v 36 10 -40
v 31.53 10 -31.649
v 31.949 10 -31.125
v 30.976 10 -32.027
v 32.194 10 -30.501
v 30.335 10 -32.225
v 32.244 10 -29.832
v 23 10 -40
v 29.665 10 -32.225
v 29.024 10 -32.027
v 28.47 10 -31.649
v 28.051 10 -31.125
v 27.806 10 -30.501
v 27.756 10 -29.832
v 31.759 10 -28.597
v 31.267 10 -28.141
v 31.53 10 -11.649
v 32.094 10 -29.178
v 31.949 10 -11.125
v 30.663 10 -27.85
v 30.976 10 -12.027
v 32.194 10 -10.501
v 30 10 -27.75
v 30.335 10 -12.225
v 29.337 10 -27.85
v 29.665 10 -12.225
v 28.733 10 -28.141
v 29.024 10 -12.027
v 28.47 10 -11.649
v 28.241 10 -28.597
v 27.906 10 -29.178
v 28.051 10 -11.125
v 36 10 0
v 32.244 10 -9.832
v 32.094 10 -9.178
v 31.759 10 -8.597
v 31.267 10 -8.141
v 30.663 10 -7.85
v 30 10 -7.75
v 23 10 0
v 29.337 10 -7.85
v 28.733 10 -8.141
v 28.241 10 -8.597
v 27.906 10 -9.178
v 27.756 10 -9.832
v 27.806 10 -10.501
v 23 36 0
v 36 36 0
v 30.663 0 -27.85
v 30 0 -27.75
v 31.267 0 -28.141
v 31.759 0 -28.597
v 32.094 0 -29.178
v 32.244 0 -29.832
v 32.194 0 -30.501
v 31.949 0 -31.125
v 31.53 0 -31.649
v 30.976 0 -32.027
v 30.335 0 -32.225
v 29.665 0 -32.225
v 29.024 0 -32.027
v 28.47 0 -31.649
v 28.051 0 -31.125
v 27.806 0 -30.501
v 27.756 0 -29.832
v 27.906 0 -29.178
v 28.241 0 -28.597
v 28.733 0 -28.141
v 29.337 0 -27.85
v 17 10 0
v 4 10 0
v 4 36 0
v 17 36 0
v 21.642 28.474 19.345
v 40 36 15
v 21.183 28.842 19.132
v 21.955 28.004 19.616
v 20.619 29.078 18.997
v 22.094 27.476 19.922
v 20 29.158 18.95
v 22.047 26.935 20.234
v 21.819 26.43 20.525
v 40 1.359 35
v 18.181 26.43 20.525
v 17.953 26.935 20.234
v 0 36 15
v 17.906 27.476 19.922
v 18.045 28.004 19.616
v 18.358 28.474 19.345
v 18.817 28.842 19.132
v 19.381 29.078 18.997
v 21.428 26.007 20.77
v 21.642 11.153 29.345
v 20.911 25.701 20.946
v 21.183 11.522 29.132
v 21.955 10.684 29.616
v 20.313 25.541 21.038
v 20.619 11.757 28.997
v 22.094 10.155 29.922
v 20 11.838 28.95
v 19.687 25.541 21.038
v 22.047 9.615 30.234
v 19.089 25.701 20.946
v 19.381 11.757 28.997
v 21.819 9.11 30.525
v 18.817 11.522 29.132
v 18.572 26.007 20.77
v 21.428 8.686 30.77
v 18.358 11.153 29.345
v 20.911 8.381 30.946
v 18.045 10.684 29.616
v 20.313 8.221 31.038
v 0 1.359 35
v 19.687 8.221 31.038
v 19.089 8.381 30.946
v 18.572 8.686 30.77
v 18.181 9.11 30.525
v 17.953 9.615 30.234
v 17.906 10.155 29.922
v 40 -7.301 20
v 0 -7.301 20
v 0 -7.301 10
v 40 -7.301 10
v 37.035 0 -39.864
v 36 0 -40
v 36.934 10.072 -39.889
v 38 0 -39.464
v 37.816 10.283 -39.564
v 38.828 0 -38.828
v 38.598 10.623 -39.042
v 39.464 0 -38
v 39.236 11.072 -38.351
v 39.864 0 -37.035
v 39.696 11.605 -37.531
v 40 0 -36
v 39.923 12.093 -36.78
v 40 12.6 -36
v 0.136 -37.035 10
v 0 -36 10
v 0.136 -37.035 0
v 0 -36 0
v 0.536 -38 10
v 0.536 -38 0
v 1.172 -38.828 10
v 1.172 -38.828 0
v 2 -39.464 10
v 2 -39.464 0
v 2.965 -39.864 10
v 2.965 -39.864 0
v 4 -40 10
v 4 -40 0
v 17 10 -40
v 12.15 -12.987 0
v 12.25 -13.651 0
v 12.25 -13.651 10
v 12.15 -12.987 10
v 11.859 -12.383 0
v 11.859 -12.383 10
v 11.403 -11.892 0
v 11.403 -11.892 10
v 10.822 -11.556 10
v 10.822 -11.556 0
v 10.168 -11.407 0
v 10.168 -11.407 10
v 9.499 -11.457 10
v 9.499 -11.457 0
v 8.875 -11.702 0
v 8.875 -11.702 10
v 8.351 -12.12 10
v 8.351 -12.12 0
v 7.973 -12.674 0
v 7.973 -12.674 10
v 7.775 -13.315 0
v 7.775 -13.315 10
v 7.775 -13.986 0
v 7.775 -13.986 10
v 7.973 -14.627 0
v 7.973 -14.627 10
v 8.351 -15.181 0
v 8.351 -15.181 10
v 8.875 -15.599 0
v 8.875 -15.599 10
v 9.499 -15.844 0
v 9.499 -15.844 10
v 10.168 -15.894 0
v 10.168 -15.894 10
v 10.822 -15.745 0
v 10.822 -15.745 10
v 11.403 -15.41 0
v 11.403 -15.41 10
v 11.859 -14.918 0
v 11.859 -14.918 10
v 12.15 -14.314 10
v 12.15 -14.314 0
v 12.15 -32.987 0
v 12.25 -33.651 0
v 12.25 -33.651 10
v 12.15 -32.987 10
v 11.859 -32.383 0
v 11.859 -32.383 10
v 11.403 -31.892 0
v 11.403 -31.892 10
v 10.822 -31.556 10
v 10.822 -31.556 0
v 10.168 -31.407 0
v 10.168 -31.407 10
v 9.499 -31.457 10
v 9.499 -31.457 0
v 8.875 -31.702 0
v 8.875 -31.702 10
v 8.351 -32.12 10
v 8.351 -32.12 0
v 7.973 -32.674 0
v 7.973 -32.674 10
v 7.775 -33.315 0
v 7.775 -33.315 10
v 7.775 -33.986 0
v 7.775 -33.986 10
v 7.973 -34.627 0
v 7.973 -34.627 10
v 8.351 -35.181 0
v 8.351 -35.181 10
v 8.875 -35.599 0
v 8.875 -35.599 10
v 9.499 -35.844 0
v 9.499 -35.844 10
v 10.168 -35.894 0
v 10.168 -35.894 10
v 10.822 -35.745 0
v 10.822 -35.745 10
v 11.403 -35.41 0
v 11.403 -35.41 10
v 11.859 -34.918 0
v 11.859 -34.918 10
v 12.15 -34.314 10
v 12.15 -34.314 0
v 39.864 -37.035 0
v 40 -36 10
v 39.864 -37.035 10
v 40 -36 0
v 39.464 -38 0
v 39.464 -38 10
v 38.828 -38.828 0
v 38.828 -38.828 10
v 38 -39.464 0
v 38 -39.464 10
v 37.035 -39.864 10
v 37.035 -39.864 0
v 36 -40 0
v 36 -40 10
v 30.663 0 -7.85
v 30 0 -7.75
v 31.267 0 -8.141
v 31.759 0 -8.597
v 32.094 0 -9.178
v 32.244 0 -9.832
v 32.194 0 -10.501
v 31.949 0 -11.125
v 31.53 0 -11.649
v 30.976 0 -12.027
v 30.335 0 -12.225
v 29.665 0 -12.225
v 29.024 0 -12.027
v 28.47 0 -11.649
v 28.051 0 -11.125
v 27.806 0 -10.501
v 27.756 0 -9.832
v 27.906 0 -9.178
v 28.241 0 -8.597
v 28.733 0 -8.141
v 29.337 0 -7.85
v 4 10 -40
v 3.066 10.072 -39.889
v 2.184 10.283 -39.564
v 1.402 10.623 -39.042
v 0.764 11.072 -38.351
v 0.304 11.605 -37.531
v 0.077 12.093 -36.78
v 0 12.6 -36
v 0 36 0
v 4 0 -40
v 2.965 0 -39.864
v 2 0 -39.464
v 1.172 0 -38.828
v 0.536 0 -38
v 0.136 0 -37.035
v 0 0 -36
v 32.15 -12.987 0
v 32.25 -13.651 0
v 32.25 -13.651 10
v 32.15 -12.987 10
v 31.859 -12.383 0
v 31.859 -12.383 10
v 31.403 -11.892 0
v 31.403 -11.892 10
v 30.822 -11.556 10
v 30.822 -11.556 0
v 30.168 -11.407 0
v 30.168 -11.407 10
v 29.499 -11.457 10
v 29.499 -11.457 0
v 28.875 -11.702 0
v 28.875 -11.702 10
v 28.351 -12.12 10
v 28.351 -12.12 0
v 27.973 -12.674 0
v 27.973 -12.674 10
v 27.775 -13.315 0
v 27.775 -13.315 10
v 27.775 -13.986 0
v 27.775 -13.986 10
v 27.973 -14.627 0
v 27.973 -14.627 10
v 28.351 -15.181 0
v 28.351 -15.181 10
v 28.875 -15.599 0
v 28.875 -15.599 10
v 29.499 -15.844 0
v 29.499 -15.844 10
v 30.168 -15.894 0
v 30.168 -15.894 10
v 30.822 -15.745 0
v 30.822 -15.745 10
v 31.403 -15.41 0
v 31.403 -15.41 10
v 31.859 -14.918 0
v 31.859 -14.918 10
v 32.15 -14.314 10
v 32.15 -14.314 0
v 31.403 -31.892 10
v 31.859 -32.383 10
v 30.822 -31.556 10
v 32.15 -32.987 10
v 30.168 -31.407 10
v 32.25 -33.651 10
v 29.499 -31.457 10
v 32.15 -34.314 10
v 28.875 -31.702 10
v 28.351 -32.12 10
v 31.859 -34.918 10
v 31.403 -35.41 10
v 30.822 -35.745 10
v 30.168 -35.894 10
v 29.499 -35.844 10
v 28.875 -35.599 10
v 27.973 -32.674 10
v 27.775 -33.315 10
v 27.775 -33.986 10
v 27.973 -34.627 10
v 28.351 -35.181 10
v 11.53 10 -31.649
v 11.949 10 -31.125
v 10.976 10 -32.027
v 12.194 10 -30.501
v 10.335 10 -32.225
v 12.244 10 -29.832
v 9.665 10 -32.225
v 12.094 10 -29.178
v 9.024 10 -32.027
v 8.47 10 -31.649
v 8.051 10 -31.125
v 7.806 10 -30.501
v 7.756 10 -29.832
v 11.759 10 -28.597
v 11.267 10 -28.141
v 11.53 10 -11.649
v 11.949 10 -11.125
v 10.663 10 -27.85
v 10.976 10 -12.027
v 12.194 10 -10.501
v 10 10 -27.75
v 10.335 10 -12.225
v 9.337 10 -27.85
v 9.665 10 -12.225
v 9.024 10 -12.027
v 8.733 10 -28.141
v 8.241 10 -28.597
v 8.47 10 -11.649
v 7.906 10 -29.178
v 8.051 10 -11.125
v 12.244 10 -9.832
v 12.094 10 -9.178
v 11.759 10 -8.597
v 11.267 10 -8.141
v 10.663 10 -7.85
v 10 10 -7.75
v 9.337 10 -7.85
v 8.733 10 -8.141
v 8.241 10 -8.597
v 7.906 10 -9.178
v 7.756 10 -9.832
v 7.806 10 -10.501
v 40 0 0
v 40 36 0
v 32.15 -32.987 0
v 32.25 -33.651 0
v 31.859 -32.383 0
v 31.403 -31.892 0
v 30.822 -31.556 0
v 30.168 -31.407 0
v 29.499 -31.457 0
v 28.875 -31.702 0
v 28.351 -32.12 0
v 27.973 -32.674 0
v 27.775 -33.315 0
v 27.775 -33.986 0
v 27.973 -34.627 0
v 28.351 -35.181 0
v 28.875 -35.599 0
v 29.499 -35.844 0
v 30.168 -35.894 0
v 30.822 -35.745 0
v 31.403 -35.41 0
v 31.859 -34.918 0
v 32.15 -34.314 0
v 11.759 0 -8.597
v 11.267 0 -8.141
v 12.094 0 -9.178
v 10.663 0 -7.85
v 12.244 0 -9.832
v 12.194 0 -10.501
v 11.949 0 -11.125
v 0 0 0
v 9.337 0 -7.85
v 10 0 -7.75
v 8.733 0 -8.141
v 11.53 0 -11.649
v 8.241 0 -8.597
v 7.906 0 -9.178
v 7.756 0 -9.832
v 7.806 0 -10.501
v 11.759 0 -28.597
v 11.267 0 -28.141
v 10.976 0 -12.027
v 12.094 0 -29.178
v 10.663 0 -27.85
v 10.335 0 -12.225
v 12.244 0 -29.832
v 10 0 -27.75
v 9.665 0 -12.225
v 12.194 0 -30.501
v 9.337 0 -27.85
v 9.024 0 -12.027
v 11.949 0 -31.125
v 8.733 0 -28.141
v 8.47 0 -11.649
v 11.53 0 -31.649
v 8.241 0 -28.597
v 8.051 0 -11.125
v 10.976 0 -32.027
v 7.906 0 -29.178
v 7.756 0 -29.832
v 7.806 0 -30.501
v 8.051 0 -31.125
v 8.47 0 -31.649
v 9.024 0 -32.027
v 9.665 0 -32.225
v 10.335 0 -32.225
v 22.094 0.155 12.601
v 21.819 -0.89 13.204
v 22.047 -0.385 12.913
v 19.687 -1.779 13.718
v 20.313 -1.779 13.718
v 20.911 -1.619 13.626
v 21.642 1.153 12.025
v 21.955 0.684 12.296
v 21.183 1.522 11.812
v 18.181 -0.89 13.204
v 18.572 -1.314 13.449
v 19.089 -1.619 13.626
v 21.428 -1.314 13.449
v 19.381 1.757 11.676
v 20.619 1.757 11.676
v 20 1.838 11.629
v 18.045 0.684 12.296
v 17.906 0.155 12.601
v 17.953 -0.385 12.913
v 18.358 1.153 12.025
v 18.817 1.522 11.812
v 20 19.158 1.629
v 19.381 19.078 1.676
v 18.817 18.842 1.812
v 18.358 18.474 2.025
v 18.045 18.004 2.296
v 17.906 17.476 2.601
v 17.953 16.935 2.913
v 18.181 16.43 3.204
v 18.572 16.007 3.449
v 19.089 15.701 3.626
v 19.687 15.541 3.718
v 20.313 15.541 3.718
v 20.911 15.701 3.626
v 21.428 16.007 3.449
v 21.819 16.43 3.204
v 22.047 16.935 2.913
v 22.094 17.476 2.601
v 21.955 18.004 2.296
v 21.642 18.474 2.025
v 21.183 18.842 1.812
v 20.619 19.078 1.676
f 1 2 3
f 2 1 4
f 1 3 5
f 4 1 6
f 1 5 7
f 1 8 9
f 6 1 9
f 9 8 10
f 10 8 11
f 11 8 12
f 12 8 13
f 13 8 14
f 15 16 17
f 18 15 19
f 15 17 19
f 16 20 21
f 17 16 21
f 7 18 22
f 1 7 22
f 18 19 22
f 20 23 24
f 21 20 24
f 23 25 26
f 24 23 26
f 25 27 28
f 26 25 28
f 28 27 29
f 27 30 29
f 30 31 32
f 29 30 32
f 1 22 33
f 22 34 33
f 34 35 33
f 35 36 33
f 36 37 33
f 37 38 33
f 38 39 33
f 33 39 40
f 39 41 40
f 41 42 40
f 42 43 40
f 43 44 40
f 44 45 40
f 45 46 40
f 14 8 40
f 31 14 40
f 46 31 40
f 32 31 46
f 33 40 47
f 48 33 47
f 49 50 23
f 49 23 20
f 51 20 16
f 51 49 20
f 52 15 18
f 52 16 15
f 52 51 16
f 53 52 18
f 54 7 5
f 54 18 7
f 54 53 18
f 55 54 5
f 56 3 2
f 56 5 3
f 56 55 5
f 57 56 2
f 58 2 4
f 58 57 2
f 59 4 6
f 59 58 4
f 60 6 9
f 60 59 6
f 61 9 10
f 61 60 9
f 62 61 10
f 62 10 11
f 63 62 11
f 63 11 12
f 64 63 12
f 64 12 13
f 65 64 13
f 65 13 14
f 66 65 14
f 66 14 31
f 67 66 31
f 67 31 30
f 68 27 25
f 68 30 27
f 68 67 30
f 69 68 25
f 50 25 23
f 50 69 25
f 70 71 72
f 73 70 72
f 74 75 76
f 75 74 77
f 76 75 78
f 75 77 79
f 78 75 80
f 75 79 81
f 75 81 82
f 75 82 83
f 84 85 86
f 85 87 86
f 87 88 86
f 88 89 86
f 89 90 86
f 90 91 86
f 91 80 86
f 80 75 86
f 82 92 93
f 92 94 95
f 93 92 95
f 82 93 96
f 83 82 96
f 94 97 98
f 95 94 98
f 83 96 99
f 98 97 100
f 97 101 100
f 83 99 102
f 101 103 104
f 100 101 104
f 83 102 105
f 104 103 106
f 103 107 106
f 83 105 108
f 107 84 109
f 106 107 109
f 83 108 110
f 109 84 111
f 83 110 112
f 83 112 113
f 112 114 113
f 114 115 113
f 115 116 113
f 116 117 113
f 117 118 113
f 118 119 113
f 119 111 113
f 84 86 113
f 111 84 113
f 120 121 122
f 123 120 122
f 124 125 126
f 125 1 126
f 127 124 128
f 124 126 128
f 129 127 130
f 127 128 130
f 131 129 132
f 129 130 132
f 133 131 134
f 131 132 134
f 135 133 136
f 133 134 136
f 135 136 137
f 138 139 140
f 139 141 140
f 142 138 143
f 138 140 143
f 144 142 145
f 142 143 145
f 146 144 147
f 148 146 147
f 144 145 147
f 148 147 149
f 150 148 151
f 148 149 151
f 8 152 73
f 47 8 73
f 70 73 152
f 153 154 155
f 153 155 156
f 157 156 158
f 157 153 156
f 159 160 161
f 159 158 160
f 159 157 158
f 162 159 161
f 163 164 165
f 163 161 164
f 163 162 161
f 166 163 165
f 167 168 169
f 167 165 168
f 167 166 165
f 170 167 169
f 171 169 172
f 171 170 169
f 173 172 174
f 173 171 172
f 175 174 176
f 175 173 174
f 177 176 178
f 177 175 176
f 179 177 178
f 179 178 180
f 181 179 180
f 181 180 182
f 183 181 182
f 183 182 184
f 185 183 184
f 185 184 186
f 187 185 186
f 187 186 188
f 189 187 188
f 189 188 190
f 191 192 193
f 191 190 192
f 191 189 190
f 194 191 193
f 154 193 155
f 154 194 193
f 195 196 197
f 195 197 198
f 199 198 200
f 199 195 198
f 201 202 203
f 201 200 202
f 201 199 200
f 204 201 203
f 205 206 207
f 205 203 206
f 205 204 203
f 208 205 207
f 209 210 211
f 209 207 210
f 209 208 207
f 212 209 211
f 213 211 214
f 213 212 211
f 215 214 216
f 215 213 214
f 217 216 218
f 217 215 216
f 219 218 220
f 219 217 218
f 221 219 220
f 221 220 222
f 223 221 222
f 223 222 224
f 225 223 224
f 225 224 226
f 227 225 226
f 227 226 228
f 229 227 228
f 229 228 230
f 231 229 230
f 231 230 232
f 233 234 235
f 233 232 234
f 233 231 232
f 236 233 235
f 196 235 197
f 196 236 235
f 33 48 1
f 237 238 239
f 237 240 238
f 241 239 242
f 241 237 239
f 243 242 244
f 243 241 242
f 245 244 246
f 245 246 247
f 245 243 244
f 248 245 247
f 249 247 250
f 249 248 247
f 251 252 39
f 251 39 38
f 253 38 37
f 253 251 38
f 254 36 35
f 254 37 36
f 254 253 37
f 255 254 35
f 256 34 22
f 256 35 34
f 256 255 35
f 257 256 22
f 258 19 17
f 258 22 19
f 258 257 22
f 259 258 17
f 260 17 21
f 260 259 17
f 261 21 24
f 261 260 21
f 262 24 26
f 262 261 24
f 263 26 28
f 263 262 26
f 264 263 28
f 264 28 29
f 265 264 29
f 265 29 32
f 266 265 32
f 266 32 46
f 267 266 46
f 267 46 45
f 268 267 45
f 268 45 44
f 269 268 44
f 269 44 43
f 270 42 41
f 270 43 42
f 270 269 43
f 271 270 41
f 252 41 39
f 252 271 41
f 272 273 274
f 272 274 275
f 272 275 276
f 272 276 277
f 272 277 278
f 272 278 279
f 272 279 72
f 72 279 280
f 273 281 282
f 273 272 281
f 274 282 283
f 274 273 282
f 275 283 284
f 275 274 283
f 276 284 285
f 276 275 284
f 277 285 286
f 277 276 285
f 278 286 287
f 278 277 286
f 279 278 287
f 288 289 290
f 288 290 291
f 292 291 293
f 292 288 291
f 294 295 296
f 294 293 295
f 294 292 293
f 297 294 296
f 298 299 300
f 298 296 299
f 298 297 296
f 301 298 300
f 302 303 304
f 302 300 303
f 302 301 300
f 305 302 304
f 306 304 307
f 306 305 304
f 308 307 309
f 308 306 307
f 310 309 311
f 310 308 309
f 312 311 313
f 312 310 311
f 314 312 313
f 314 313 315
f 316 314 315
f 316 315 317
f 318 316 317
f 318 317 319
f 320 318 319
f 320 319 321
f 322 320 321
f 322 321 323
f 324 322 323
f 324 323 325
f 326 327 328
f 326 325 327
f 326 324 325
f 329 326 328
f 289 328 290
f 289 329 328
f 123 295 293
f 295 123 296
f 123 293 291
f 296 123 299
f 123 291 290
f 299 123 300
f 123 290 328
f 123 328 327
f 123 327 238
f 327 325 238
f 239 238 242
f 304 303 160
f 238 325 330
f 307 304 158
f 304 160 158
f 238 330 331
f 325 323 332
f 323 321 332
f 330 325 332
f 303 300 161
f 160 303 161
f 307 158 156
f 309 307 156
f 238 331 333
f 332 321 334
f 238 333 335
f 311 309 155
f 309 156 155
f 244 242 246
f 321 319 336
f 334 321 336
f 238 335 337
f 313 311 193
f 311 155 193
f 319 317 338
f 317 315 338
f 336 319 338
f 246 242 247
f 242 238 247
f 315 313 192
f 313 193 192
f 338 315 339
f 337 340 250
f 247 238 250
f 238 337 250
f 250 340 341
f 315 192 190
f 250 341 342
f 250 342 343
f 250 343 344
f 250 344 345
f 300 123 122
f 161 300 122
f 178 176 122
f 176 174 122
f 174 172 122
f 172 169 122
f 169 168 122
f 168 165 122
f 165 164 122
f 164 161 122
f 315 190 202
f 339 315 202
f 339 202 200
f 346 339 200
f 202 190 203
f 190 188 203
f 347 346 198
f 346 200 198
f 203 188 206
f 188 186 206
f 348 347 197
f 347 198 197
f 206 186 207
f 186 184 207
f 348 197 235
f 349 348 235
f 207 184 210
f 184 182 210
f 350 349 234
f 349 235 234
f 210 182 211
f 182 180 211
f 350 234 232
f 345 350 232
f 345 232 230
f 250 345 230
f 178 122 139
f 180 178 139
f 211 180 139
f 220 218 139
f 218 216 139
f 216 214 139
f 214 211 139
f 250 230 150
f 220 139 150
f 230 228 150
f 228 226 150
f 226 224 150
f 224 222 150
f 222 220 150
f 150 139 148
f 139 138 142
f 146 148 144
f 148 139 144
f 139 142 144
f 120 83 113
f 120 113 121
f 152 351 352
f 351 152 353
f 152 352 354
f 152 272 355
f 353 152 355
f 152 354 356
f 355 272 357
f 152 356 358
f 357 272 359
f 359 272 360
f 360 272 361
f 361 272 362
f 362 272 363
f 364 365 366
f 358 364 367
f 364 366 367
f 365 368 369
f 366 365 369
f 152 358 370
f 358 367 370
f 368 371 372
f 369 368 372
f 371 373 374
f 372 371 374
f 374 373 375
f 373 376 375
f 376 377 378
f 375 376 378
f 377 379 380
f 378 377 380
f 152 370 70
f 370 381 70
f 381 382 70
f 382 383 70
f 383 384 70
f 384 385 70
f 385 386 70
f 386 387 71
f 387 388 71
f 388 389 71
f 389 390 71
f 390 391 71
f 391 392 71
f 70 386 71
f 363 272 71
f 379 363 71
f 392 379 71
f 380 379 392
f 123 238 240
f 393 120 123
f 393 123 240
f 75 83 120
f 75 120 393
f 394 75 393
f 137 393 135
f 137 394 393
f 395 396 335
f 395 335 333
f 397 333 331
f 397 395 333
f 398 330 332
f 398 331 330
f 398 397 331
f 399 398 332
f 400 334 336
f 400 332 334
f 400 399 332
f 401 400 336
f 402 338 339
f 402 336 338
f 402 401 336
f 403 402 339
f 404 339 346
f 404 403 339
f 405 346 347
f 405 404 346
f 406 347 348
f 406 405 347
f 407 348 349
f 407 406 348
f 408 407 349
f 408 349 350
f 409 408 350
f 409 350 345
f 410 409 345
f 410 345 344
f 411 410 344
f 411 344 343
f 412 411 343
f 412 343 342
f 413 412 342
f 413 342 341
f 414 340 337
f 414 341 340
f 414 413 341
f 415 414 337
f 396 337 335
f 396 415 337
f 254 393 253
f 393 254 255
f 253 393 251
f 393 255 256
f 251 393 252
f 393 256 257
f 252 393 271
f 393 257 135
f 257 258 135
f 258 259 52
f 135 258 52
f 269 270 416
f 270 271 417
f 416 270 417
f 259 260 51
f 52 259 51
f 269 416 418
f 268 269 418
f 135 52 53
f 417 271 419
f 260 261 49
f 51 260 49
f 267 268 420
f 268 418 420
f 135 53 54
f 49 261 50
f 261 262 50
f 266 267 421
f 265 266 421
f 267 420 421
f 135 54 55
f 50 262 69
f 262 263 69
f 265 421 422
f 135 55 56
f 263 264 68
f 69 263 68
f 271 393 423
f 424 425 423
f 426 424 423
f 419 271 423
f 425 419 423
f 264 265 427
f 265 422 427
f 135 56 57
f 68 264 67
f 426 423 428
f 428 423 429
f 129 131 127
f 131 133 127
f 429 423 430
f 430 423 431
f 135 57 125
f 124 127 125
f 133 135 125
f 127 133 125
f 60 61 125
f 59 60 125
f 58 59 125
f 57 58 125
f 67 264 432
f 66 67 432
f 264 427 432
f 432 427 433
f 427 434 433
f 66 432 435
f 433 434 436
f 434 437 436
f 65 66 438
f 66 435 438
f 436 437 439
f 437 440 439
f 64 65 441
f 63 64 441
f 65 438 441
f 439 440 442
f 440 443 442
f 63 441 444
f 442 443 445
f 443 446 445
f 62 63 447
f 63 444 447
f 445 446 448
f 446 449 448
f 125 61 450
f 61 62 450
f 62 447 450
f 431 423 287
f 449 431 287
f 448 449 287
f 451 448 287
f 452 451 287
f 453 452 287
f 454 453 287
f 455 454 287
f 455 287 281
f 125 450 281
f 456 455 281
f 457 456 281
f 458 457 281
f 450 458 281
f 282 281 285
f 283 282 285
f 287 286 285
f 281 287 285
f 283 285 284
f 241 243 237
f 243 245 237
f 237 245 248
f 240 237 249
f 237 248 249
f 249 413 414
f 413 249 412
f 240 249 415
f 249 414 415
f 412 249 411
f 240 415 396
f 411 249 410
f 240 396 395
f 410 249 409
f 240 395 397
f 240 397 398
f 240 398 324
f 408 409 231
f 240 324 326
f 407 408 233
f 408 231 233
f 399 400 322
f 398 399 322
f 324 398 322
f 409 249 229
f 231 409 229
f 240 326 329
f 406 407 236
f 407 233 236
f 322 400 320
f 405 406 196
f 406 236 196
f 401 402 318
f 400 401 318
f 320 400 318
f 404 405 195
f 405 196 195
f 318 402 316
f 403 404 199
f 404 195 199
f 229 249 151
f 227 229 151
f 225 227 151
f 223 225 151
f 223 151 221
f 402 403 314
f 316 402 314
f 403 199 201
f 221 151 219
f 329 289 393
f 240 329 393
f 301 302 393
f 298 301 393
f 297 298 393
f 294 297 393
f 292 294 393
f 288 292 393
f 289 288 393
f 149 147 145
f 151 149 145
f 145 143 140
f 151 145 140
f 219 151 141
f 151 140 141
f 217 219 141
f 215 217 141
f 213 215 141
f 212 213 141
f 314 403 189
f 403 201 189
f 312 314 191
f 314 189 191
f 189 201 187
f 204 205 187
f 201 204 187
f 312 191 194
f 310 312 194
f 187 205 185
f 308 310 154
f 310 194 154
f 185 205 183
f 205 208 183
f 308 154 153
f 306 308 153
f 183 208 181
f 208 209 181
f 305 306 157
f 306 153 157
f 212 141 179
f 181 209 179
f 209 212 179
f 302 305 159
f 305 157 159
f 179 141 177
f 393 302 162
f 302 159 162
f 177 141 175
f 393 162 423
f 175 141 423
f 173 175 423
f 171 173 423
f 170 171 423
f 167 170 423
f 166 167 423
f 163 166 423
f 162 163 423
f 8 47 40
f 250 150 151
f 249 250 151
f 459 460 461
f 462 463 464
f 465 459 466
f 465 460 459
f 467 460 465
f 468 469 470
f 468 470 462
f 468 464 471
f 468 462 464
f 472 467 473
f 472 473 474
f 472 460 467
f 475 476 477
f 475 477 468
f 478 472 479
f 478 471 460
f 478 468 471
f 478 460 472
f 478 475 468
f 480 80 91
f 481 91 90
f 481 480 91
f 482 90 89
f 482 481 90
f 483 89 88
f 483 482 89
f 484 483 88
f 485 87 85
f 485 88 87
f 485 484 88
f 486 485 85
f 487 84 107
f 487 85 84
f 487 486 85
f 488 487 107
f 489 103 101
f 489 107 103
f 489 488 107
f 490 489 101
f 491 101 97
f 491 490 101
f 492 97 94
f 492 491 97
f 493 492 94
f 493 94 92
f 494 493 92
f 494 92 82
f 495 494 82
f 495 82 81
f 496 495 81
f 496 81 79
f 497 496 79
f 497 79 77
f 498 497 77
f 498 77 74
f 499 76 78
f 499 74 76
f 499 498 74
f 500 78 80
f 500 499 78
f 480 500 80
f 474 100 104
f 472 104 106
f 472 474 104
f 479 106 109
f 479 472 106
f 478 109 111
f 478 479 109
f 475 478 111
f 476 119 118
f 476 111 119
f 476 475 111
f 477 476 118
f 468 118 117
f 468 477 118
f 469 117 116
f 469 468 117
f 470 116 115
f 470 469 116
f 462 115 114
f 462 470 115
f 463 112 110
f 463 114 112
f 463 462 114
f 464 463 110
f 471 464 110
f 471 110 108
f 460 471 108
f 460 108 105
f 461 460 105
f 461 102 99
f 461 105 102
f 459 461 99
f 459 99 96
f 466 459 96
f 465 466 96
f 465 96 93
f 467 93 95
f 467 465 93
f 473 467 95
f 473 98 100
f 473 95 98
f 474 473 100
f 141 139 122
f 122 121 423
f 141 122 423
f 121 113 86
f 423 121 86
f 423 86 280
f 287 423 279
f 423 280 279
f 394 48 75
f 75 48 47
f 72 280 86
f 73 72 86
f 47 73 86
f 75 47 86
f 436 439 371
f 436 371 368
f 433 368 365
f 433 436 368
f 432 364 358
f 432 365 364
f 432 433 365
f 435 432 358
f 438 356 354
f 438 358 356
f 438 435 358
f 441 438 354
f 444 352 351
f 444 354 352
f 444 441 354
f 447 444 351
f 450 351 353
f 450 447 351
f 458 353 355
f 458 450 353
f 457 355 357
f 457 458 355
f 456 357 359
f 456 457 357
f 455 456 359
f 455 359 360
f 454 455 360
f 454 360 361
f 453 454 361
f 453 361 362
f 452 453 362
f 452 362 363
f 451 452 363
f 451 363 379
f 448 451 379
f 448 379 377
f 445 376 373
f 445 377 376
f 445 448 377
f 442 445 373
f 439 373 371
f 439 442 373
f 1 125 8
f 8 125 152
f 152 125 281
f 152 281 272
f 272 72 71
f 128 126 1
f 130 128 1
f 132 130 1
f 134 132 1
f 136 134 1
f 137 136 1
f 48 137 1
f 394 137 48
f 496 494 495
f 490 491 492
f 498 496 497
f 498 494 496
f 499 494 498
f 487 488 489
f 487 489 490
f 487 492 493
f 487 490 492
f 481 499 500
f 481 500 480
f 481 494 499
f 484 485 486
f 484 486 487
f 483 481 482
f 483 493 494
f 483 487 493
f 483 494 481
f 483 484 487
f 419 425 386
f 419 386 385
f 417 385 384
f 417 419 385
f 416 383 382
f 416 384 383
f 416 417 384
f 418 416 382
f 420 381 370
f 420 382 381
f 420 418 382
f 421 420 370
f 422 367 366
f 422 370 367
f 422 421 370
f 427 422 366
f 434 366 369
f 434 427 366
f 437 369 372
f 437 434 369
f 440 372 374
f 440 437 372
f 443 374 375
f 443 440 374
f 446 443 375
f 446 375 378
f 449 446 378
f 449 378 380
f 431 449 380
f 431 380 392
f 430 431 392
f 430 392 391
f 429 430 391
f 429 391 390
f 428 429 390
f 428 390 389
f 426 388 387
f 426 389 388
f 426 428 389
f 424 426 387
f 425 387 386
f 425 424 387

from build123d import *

# Parameters (mm, degrees)
BOSS_EXTRU_1_DEPTH           = 40
ENL_V_MAT_EXTRU_1_DEPTH      = 76.498344353
ENL_V_MAT_EXTRU_1_DEPTH_BACK = 76.498344353
ESQUISSE2_R                  = 2.25
ENL_V_MAT_EXTRU_2_DEPTH      = 76.498344353
ENL_V_MAT_EXTRU_2_DEPTH_BACK = 76.498344353
ESQUISSE3_R                  = 2.25
ENL_V_MAT_EXTRU_3_DEPTH      = 96.640449297
ENL_V_MAT_EXTRU_3_DEPTH_BACK = 20
ESQUISSE4_R                  = 2.1
BOSS_EXTRU_2_DEPTH           = 4
BOSS_EXTRU_3_START           = -40
BOSS_EXTRU_3_DEPTH           = 4
BOSS_EXTRU_4_DEPTH           = 3
BOSS_EXTRU_4_DEPTH_BACK      = 3
BOSS_EXTRU_4_START           = -20
CONG_1_R                     = 4


with BuildPart() as part:
    # Esquisse1 → Boss.-Extru.1 (new body)
    with BuildSketch(Plane(origin=(0, 0, 0), x_dir=(0, 0, -1), z_dir=(1, 0, 0))):
        Polygon((0, 0), (40, 0), (40, 10), (0, 10), (0, 36), (-15, 36), (-35, 1.358983849), (-20, -7.301270189), (-10, -7.301270189), (-10, -40), (0, -40), align=None)
    extrude(amount=BOSS_EXTRU_1_DEPTH)

    # Esquisse2 → Enlèv. mat.-Extru.1 (cut, two sides: drawn at the far end of the back side and taken through both)
    with BuildSketch(Plane(origin=(0, 10, 0), x_dir=(1, 0, 0), z_dir=(0, 1, 0)).offset(-ENL_V_MAT_EXTRU_1_DEPTH_BACK)):
        with Locations(Location((10, 30, 0), (0, 0, 270))):
            Circle(ESQUISSE2_R)
        with Locations(Location((30, 30, 0), (0, 0, 270))):
            Circle(ESQUISSE2_R)
        with Locations(Location((30, 10, 0), (0, 0, 270))):
            Circle(ESQUISSE2_R)
        with Locations(Location((10, 10, 0), (0, 0, 270))):
            Circle(ESQUISSE2_R)
    extrude(amount=ENL_V_MAT_EXTRU_1_DEPTH + ENL_V_MAT_EXTRU_1_DEPTH_BACK, mode=Mode.SUBTRACT)

    # Esquisse3 → Enlèv. mat.-Extru.2 (cut, two sides: drawn at the far end of the back side and taken through both)
    with BuildSketch(Plane.XY.offset(10).offset(-ENL_V_MAT_EXTRU_2_DEPTH_BACK)):
        with Locations((10, -33.650635095)):
            Circle(ESQUISSE3_R)
        with Locations((30, -33.650635095)):
            Circle(ESQUISSE3_R)
        with Locations((30, -13.650635095)):
            Circle(ESQUISSE3_R)
        with Locations((10, -13.650635095)):
            Circle(ESQUISSE3_R)
    extrude(amount=ENL_V_MAT_EXTRU_2_DEPTH + ENL_V_MAT_EXTRU_2_DEPTH_BACK, mode=Mode.SUBTRACT)

    # Esquisse4 → Enlèv. mat.-Extru.3 (cut, two sides: drawn at the far end of the back side and taken through both)
    with BuildSketch(Plane(origin=(0, 15.495190528, 26.838457268), x_dir=(1, 0, 0), z_dir=(0, 0.4999999999999946, 0.8660254037844419)).offset(-ENL_V_MAT_EXTRU_3_DEPTH_BACK)):
        with Locations(Location((20, 13.676914536, 0), (0, 0, 90))):
            Circle(ESQUISSE4_R)
        with Locations(Location((20, -6.323085464, 0), (0, 0, 90))):
            Circle(ESQUISSE4_R)
    extrude(amount=ENL_V_MAT_EXTRU_3_DEPTH + ENL_V_MAT_EXTRU_3_DEPTH_BACK, mode=Mode.SUBTRACT)

    # Esquisse5 → Boss.-Extru.2 (add)
    with BuildSketch(Plane(origin=(40, 0, 0), x_dir=(0, 0, -1), z_dir=(1, 0, 0))):
        Polygon((40, 10), (0, 36), (0, 10), align=None)
    extrude(amount=-BOSS_EXTRU_2_DEPTH)

    # Esquisse5<2> → Boss.-Extru.3 (add)
    with BuildSketch(Plane(origin=(40, 0, 0), x_dir=(0, 0, -1), z_dir=(1, 0, 0)).offset(BOSS_EXTRU_3_START)):
        Polygon((40, 10), (0, 36), (0, 10), align=None)
    extrude(amount=BOSS_EXTRU_3_DEPTH)

    # Esquisse5<3> → Boss.-Extru.4 (add, two sides: drawn at the far end of the back side and taken through both)
    with BuildSketch(Plane(origin=(40, 0, 0), x_dir=(0, 0, -1), z_dir=(1, 0, 0)).offset(BOSS_EXTRU_4_START - BOSS_EXTRU_4_DEPTH_BACK)):
        Polygon((40, 10), (0, 36), (0, 10), align=None)
    extrude(amount=BOSS_EXTRU_4_DEPTH + BOSS_EXTRU_4_DEPTH_BACK)

    # Congé1
    cong_1_edges = [part.edges().sort_by_distance(p)[0] for p in [
        (0, 5, -40),
        (40, 5, -40),
        (0, -40, 5),
        (40, -40, 5),
    ]]
    fillet(cong_1_edges, radius=CONG_1_R)


solid = part.part
